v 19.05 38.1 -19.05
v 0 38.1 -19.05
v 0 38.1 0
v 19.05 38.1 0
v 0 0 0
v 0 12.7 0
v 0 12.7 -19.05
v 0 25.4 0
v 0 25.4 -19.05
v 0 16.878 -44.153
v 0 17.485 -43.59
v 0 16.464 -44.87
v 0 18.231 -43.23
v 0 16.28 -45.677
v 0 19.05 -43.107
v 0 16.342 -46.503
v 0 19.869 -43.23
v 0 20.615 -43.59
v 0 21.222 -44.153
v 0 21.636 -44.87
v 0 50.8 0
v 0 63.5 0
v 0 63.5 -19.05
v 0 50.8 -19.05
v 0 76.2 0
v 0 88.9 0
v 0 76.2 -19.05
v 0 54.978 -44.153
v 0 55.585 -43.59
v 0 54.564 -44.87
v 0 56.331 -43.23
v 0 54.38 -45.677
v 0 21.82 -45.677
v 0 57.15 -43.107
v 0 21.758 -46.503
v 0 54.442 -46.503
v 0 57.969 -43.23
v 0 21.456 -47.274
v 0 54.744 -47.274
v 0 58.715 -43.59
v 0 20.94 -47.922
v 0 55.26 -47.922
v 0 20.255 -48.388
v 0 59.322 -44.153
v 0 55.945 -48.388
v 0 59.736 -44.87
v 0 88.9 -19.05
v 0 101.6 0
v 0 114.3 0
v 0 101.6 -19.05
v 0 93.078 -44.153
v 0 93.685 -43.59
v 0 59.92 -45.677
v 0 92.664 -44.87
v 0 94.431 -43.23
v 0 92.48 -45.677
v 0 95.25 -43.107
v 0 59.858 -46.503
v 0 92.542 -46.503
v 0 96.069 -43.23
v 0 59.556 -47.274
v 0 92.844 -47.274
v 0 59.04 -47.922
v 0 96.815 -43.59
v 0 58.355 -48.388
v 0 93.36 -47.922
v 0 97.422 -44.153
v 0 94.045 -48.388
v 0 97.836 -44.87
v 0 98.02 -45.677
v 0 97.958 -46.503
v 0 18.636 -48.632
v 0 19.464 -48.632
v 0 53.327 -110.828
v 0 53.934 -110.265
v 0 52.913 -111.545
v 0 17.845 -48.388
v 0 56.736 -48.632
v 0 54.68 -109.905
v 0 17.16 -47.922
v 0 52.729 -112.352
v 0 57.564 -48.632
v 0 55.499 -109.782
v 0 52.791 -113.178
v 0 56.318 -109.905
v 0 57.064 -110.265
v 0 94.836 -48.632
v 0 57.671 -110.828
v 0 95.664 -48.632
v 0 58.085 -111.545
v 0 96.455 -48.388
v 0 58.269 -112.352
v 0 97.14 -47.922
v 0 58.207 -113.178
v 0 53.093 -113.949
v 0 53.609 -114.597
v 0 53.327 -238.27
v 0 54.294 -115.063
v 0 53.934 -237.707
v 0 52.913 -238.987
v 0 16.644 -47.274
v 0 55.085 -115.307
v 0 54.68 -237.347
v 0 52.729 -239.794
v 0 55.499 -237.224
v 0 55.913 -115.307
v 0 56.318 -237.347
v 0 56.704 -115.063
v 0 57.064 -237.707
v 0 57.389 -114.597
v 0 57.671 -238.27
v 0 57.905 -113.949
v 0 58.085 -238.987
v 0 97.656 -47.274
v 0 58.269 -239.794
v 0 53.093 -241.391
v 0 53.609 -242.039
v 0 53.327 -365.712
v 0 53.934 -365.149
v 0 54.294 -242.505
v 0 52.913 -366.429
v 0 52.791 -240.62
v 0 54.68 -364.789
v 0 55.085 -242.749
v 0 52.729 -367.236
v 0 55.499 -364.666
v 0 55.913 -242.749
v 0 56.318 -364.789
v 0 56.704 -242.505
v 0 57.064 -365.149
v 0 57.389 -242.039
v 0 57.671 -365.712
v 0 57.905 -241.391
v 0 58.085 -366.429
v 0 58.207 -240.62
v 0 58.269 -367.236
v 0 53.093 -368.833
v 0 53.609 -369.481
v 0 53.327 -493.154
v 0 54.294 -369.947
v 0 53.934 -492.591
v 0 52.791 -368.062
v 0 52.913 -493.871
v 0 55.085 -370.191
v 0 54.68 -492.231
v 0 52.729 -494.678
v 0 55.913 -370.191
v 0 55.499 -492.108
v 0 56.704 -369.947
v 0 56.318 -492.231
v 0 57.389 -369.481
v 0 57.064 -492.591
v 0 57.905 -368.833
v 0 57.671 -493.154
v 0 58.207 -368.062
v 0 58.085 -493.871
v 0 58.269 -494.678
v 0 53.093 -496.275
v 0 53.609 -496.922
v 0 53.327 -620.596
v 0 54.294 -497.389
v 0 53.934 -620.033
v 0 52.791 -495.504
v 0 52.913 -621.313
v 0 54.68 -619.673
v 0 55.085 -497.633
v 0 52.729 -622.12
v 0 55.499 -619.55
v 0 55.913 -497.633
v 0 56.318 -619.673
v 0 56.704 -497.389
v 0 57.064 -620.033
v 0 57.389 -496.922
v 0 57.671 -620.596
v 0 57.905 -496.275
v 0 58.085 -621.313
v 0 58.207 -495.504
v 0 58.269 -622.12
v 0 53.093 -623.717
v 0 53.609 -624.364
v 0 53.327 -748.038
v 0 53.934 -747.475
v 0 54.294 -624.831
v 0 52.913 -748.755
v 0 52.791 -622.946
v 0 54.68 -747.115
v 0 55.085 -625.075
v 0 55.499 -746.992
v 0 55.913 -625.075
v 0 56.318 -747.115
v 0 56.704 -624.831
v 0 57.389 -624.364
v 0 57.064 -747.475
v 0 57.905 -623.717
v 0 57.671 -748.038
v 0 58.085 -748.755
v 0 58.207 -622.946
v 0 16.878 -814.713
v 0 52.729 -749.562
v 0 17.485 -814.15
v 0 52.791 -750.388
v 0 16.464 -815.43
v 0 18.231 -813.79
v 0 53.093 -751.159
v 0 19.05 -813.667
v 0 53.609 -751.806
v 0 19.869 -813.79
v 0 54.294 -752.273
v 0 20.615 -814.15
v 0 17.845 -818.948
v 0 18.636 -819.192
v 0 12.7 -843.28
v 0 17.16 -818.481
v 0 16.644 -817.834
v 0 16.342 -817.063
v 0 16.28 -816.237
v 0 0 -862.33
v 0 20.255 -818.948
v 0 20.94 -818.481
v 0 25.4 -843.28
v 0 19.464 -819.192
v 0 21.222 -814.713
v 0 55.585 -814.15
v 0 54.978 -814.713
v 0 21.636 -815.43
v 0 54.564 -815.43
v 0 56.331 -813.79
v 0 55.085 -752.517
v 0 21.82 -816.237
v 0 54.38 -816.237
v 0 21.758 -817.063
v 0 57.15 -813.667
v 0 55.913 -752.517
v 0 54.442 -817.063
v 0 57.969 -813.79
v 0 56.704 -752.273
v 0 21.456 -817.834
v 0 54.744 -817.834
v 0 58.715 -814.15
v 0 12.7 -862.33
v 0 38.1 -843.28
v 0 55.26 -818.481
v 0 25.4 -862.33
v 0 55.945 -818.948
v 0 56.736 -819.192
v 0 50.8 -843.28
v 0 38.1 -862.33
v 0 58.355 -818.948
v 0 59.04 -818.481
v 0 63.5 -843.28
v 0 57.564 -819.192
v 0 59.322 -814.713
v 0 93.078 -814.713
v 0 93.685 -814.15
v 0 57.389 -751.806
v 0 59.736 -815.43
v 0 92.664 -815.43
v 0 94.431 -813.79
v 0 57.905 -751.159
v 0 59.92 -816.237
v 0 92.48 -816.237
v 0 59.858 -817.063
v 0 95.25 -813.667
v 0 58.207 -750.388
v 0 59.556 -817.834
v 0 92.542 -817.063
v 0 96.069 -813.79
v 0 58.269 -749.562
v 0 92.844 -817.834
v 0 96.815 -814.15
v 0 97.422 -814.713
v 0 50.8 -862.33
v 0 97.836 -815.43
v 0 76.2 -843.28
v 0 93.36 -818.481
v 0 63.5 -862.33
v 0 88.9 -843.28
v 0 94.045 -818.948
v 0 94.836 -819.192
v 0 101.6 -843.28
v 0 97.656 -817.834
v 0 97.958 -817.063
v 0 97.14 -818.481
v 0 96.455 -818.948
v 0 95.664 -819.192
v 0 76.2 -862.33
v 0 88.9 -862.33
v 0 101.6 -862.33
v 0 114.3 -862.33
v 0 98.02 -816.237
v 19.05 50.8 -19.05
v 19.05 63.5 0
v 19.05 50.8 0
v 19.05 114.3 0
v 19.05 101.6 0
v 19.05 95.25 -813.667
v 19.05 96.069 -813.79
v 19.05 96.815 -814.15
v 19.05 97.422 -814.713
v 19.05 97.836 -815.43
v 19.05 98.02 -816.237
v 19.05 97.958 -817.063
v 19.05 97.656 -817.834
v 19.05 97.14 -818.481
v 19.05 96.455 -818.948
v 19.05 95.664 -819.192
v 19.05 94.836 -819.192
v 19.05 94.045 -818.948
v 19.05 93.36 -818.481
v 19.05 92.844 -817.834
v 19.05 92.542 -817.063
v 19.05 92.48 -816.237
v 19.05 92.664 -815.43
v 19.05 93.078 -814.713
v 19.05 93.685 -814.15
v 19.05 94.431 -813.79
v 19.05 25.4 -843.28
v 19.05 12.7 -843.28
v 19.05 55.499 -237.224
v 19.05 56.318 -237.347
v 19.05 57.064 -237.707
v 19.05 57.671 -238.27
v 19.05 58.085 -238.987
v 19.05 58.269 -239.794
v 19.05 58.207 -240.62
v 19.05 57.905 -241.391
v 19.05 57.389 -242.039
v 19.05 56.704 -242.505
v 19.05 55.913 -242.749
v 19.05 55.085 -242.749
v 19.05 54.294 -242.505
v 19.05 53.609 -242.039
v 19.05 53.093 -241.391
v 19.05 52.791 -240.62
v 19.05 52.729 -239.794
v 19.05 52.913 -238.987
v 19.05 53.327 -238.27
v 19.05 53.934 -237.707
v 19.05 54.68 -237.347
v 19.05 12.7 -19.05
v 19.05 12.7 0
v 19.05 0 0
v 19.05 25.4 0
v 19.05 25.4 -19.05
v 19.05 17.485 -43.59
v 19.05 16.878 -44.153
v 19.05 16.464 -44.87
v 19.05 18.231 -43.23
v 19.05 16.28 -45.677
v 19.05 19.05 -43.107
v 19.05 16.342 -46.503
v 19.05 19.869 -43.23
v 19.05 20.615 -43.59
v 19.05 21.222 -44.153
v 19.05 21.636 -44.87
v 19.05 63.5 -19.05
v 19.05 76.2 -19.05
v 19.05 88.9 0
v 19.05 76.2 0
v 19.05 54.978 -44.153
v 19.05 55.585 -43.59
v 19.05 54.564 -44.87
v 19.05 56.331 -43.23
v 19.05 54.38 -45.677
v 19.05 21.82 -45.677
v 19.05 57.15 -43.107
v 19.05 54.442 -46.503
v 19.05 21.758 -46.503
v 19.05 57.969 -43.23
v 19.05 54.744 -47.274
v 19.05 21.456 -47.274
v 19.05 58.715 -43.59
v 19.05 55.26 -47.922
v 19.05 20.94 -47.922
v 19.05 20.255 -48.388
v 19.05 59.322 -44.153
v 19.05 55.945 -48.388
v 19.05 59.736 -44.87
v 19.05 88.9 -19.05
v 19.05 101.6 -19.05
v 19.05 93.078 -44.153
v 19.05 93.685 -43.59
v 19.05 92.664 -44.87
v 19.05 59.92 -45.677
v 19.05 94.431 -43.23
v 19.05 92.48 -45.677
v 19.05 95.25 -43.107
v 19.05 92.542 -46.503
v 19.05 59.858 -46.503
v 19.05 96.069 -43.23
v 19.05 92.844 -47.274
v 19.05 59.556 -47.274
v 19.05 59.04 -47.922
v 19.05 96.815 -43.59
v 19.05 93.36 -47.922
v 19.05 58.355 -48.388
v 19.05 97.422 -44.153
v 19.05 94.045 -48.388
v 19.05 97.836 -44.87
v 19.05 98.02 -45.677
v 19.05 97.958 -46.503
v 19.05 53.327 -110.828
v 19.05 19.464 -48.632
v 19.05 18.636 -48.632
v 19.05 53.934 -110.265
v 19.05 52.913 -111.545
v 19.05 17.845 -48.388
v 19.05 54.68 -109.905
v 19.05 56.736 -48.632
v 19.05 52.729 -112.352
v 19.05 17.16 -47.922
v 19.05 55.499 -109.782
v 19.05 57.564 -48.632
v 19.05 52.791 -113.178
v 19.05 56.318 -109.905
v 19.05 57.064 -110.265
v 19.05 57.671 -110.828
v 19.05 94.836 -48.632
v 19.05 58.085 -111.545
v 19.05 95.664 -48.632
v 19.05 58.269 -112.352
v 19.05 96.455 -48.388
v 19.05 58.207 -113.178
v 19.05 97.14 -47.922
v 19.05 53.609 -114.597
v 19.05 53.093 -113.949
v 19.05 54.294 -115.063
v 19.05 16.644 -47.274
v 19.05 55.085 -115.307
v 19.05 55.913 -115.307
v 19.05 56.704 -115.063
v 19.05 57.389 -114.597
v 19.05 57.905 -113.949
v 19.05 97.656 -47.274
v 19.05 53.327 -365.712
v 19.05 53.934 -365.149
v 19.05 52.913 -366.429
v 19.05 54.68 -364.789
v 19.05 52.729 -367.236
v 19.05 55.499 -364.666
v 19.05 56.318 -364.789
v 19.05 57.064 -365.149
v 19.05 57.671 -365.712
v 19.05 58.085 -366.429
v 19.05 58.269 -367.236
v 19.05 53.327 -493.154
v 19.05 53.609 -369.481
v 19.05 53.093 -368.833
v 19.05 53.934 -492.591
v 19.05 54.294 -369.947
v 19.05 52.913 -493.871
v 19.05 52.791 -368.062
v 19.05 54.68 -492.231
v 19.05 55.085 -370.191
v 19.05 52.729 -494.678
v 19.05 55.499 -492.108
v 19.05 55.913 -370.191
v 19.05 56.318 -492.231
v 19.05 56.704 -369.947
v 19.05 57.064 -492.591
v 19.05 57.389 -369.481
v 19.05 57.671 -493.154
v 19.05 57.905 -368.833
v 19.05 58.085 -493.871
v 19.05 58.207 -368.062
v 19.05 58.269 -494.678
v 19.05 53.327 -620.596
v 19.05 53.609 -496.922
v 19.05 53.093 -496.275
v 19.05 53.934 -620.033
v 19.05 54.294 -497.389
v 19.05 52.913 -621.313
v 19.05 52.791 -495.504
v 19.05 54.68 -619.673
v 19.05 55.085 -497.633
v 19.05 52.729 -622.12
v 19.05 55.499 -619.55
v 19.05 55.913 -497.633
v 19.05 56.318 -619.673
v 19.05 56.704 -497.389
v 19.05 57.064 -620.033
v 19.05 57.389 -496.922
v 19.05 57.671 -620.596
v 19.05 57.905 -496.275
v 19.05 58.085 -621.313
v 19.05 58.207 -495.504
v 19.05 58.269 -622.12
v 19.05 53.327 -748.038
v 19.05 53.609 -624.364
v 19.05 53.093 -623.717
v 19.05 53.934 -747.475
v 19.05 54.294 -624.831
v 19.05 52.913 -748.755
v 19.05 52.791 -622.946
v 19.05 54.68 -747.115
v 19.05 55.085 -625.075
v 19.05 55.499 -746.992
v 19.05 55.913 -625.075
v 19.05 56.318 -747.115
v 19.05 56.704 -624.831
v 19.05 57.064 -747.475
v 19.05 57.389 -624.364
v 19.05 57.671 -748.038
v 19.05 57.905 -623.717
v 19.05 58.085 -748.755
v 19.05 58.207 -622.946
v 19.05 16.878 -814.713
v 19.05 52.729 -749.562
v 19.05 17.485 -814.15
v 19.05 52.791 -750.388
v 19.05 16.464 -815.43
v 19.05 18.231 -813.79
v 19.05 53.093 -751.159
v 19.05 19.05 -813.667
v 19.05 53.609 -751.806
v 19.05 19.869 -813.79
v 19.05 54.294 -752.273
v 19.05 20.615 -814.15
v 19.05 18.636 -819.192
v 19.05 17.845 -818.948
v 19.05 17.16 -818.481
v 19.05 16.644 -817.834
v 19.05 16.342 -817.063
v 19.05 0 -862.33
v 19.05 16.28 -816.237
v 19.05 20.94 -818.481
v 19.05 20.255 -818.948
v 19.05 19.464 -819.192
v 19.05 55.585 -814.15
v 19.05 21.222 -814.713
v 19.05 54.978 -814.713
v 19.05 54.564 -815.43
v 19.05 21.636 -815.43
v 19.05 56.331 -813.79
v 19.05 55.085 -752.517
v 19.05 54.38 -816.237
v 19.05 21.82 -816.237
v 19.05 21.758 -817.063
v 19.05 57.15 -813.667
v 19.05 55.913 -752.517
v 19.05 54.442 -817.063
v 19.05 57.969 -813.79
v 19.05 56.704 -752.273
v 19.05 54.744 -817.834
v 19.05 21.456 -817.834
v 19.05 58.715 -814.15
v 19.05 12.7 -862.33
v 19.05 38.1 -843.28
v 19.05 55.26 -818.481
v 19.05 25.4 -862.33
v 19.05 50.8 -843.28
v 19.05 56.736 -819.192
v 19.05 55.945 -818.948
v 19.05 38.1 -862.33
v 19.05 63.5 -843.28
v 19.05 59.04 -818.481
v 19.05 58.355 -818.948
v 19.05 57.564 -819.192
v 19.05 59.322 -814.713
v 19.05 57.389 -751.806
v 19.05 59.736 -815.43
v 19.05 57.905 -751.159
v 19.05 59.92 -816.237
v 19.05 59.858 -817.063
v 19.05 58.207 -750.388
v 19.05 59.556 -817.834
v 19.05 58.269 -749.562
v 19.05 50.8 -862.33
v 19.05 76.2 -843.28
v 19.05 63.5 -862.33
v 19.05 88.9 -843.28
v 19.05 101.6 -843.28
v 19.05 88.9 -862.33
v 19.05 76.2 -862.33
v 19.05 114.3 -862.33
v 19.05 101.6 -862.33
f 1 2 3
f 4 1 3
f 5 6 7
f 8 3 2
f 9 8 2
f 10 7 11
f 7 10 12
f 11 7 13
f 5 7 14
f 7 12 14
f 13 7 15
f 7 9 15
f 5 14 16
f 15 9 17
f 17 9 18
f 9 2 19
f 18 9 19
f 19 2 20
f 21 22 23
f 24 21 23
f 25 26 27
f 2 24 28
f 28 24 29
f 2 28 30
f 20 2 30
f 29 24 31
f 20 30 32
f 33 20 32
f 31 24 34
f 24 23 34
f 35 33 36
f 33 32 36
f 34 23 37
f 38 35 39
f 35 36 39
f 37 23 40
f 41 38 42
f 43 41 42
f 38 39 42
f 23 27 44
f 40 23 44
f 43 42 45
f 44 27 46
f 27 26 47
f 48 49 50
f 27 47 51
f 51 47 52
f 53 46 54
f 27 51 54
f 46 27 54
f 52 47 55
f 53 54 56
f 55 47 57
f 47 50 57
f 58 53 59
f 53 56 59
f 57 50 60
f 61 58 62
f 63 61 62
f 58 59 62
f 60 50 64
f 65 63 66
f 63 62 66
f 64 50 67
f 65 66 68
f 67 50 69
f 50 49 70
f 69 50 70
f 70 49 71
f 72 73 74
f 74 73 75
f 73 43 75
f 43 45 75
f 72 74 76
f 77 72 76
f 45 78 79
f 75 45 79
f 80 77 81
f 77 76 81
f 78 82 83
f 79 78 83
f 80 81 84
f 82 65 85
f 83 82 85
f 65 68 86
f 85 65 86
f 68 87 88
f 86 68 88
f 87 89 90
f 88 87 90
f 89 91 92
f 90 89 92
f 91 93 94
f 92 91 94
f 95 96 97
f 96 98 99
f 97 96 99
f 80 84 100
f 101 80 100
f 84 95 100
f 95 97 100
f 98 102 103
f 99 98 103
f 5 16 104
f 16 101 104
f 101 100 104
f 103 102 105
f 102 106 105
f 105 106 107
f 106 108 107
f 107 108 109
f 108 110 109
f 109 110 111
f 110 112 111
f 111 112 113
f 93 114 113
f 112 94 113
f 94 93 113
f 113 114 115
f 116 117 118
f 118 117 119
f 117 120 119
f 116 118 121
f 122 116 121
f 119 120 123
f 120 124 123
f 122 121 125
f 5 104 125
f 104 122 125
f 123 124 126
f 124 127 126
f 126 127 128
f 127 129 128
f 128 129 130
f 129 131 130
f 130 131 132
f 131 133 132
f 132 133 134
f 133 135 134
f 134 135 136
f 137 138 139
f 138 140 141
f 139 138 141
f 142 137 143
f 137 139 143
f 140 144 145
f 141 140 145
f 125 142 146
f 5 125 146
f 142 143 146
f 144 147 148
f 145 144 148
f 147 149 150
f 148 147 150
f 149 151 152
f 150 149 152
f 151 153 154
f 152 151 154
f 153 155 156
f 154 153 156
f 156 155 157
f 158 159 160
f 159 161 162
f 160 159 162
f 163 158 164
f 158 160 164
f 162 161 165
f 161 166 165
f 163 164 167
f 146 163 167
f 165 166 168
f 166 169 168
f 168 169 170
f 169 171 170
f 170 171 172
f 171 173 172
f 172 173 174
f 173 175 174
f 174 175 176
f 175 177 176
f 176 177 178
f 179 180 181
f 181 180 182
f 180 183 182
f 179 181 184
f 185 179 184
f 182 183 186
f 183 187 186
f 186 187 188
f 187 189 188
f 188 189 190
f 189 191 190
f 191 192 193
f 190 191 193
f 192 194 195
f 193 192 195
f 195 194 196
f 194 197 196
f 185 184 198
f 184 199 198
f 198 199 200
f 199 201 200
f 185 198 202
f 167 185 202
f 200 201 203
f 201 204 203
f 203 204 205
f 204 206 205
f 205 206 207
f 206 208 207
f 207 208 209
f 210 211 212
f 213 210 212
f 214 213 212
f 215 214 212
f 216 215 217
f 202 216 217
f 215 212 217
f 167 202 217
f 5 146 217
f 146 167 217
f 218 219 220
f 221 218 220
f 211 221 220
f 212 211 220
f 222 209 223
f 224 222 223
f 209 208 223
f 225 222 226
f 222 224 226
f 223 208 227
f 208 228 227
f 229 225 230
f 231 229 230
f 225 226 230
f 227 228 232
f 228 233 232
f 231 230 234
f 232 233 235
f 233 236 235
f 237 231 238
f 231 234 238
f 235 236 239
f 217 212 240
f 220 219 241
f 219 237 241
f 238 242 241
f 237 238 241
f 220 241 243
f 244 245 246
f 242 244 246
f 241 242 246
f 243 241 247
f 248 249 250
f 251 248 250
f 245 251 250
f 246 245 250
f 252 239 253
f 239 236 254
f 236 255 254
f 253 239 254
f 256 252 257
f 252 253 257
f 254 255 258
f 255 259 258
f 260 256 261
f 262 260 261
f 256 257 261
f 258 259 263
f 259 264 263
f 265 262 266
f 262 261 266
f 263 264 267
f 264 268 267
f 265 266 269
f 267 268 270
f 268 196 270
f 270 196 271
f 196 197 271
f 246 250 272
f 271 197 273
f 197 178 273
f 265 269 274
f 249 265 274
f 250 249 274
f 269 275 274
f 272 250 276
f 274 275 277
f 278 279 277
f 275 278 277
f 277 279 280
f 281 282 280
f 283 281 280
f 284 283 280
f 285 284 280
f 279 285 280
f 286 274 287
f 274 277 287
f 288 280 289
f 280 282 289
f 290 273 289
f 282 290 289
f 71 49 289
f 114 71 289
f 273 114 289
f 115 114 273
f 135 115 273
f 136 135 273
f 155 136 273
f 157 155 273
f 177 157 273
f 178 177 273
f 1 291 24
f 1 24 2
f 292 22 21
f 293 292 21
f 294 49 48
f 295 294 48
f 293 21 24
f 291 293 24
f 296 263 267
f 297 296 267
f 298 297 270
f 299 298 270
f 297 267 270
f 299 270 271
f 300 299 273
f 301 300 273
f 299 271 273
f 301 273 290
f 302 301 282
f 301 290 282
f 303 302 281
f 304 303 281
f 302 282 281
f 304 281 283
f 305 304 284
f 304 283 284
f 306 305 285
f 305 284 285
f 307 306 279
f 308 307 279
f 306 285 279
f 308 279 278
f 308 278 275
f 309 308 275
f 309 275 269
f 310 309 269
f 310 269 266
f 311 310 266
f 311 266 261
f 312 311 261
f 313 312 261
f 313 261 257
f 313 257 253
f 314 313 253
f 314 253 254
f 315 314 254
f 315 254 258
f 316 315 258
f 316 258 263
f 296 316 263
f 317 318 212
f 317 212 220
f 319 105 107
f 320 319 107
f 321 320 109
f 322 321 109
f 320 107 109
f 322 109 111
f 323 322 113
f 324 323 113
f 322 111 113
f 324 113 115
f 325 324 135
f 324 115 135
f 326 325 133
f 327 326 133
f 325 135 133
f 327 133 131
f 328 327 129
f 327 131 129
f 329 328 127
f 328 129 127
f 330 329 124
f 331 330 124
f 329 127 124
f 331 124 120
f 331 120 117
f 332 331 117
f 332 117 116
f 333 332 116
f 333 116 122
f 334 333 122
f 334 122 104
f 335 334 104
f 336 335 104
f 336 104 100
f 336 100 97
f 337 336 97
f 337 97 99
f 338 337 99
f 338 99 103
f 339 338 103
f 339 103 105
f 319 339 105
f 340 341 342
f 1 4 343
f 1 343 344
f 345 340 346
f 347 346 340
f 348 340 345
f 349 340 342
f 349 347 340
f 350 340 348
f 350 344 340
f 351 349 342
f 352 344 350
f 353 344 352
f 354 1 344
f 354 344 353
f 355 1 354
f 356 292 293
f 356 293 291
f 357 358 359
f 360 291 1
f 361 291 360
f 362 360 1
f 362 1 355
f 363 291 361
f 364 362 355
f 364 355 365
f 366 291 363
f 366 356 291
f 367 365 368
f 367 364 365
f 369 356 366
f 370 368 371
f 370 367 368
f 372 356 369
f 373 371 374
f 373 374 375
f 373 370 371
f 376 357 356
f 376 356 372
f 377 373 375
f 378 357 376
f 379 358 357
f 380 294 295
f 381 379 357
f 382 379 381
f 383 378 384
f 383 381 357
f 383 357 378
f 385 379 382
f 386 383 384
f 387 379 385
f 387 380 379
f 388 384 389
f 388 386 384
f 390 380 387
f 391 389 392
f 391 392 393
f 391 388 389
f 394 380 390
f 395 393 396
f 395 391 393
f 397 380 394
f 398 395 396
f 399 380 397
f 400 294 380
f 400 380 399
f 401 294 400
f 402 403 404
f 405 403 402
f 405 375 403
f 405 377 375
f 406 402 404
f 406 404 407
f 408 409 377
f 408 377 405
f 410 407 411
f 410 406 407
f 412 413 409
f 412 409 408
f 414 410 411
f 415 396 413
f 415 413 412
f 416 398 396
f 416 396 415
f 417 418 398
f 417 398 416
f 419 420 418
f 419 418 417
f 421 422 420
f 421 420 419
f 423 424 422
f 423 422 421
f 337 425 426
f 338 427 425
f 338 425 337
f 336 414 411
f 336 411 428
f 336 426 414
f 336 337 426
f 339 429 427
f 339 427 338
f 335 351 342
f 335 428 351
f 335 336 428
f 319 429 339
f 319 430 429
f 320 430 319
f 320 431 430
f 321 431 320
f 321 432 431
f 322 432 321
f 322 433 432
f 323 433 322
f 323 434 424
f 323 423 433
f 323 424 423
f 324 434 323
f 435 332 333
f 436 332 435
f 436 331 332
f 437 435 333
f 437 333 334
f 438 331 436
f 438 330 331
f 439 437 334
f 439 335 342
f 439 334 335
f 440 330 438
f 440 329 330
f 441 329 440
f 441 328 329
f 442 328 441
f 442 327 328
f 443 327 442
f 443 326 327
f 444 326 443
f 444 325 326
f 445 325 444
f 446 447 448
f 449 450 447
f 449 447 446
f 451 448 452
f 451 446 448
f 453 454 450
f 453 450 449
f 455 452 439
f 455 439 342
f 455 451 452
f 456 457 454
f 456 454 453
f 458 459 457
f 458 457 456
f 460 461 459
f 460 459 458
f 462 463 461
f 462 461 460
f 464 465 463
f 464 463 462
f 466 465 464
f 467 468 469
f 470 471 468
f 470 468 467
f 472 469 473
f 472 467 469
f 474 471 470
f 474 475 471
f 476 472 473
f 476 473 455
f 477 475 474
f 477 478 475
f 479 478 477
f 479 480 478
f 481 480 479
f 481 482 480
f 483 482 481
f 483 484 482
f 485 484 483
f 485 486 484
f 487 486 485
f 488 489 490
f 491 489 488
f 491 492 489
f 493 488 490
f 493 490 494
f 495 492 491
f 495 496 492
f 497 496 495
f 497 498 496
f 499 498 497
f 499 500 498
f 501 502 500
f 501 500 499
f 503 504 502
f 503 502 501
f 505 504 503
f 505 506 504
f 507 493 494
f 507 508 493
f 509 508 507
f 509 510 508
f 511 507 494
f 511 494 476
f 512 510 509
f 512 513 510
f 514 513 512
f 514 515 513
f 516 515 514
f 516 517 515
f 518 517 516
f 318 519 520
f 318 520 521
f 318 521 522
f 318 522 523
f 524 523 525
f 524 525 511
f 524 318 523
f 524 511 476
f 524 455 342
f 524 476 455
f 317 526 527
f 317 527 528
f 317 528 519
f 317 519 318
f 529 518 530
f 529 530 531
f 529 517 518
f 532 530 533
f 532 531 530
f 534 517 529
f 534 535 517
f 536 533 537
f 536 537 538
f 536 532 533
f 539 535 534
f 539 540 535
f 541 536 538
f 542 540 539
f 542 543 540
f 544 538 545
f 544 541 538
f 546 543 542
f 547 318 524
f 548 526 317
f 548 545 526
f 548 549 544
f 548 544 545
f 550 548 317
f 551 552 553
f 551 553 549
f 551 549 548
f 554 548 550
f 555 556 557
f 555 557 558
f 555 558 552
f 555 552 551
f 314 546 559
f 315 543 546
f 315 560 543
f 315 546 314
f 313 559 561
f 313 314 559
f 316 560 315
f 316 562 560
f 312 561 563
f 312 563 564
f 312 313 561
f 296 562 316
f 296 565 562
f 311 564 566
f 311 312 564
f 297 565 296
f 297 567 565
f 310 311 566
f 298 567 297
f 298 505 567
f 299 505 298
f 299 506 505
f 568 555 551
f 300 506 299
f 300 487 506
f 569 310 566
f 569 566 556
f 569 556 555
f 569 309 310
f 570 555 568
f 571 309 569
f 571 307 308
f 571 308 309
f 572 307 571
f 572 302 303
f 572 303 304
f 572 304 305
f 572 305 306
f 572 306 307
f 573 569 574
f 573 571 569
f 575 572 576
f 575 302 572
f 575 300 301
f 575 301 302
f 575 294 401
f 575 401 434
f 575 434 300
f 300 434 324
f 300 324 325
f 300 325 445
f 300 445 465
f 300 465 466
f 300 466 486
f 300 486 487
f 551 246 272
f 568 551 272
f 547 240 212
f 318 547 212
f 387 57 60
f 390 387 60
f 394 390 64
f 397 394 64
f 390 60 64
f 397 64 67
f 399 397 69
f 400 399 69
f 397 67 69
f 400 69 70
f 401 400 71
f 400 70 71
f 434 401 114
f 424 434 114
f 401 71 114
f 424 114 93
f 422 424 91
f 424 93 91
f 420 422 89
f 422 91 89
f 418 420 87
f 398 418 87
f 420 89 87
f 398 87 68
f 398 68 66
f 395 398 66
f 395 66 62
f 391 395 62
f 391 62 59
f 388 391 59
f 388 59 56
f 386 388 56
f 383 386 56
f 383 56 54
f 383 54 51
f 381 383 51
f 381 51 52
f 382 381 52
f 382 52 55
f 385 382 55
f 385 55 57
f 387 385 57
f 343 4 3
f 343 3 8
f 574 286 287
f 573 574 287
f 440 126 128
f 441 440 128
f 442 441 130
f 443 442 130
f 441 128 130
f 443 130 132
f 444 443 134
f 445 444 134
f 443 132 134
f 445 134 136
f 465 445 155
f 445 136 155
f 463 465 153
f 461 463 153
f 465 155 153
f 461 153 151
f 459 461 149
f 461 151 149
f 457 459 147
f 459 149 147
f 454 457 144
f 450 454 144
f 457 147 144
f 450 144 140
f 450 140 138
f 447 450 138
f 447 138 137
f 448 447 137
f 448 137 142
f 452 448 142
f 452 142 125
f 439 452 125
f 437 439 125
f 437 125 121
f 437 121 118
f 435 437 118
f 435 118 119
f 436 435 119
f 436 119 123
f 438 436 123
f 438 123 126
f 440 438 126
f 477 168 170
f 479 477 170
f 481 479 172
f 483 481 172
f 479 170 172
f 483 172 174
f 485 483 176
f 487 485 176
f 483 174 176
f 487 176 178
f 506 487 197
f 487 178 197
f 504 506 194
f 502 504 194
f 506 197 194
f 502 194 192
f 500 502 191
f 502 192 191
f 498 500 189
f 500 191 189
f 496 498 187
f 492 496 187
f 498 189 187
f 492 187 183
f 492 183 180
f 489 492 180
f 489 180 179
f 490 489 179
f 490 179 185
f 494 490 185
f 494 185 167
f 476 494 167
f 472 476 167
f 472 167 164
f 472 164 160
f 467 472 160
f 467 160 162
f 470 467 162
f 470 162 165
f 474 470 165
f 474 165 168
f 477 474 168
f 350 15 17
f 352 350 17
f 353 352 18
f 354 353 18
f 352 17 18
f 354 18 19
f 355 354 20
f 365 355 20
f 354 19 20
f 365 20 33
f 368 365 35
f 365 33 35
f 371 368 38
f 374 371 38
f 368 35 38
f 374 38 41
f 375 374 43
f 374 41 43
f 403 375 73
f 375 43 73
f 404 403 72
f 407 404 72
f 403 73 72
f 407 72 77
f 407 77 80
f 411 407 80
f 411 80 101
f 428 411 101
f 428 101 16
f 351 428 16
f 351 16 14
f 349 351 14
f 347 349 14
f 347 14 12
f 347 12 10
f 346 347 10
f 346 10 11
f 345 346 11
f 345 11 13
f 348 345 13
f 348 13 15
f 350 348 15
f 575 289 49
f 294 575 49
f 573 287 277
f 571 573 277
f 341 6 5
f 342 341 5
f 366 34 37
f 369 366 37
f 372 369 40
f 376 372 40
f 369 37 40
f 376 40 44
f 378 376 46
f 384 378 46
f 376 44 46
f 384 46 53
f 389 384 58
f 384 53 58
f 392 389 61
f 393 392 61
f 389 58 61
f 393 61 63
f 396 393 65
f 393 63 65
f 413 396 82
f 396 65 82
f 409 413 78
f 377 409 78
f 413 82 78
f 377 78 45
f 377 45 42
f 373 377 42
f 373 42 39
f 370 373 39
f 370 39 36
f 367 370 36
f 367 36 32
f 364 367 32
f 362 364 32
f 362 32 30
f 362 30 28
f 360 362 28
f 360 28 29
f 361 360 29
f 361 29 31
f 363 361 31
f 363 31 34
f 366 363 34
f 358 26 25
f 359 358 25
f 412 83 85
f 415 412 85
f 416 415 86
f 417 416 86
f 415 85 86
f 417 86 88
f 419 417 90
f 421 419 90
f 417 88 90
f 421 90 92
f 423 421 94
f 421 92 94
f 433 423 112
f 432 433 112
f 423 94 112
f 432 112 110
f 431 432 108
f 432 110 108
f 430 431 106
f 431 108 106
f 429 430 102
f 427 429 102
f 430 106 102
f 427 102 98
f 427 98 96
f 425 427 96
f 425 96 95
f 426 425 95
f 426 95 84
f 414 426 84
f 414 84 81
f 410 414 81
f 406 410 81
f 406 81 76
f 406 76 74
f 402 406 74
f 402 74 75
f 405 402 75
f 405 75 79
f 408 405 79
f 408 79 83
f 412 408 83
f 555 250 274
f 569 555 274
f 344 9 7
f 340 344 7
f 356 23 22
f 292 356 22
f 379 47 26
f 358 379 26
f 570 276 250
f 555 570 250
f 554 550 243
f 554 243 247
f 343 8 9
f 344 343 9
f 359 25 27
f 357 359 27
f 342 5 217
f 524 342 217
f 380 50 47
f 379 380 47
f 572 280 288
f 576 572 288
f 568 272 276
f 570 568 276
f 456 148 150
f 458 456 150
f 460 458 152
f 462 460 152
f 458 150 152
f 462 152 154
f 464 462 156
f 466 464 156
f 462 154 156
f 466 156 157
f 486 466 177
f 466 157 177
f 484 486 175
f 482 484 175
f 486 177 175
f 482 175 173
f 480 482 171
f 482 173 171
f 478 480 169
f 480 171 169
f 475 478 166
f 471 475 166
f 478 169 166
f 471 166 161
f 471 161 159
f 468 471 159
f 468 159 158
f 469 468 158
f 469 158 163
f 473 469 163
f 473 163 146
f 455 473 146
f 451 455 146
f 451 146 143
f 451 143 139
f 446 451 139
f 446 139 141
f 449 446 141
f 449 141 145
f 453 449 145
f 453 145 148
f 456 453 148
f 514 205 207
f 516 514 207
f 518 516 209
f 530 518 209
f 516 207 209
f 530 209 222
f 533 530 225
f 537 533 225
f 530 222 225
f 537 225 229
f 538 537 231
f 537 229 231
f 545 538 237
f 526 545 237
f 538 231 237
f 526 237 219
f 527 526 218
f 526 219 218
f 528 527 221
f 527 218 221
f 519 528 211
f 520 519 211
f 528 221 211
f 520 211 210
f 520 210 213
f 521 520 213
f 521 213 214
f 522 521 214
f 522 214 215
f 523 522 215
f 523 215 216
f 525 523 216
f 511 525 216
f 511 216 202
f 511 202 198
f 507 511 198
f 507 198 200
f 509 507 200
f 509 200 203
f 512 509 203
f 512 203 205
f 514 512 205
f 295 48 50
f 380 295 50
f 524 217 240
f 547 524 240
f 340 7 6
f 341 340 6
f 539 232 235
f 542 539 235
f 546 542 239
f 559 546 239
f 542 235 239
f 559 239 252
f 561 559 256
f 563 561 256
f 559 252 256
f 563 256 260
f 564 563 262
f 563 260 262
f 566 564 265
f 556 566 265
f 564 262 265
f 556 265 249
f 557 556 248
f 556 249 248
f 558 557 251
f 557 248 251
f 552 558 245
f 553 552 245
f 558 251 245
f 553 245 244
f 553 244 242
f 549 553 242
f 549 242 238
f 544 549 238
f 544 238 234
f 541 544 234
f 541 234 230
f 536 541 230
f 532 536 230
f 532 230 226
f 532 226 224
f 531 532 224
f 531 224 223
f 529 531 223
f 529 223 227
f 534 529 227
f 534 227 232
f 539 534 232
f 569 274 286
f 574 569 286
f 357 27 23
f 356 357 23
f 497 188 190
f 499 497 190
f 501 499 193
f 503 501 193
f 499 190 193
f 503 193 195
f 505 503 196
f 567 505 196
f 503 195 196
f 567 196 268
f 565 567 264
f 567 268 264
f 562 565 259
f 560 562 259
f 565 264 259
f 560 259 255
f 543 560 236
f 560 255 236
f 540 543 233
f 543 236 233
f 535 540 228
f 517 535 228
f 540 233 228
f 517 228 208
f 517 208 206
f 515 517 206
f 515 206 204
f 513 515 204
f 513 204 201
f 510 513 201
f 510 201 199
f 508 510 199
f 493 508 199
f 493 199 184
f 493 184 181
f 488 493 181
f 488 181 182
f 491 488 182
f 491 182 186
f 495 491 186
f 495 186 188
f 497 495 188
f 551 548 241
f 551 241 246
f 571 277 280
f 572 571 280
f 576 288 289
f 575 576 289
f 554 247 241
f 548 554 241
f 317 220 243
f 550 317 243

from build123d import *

# Parameters (mm, degrees)
BOSS_EXTRUDE1_DEPTH             = 19.05
F_7_32_0_21875_DIAMETER_HOLE2_D = 5.55625


with BuildPart() as part:
    # Sketch1 → Boss-Extrude1 (new body)
    with BuildSketch(Plane(origin=(0, 0, 0), x_dir=(0, 0, -1), z_dir=(1, 0, 0))):
        Polygon((0, 0), (862.33, 0), (862.33, 12.7), (843.28, 12.7), (843.28, 25.4), (862.33, 25.4), (862.33, 38.1), (843.28, 38.1), (843.28, 50.8), (862.33, 50.8), (862.33, 63.5), (843.28, 63.5), (843.28, 76.2), (862.33, 76.2), (862.33, 88.9), (843.28, 88.9), (843.28, 101.6), (862.33, 101.6), (862.33, 114.3), (0, 114.3), (0, 101.6), (19.05, 101.6), (19.05, 88.9), (0, 88.9), (0, 76.2), (19.05, 76.2), (19.05, 63.5), (0, 63.5), (0, 50.8), (19.05, 50.8), (19.05, 38.1), (0, 38.1), (0, 25.4), (19.05, 25.4), (19.05, 12.7), (0, 12.7), align=None)
    extrude(amount=BOSS_EXTRUDE1_DEPTH)

    # 7/32 (0.21875) Diameter Hole2 (through all)
    with Locations(Plane(origin=(19.05, 0, 0), x_dir=(0, 0, -1), z_dir=(1, 0, 0))):
        with Locations((816.4449, 57.15), (112.5601, 55.499), (240.00206, 55.499), (367.44402, 55.499), (494.88598, 55.499), (622.32794, 55.499), (749.7699, 55.499), (816.4449, 95.25), (816.4449, 19.05), (45.8851, 95.25), (45.8851, 19.05), (45.8851, 57.15)):
            Hole(F_7_32_0_21875_DIAMETER_HOLE2_D / 2)


solid = part.part
